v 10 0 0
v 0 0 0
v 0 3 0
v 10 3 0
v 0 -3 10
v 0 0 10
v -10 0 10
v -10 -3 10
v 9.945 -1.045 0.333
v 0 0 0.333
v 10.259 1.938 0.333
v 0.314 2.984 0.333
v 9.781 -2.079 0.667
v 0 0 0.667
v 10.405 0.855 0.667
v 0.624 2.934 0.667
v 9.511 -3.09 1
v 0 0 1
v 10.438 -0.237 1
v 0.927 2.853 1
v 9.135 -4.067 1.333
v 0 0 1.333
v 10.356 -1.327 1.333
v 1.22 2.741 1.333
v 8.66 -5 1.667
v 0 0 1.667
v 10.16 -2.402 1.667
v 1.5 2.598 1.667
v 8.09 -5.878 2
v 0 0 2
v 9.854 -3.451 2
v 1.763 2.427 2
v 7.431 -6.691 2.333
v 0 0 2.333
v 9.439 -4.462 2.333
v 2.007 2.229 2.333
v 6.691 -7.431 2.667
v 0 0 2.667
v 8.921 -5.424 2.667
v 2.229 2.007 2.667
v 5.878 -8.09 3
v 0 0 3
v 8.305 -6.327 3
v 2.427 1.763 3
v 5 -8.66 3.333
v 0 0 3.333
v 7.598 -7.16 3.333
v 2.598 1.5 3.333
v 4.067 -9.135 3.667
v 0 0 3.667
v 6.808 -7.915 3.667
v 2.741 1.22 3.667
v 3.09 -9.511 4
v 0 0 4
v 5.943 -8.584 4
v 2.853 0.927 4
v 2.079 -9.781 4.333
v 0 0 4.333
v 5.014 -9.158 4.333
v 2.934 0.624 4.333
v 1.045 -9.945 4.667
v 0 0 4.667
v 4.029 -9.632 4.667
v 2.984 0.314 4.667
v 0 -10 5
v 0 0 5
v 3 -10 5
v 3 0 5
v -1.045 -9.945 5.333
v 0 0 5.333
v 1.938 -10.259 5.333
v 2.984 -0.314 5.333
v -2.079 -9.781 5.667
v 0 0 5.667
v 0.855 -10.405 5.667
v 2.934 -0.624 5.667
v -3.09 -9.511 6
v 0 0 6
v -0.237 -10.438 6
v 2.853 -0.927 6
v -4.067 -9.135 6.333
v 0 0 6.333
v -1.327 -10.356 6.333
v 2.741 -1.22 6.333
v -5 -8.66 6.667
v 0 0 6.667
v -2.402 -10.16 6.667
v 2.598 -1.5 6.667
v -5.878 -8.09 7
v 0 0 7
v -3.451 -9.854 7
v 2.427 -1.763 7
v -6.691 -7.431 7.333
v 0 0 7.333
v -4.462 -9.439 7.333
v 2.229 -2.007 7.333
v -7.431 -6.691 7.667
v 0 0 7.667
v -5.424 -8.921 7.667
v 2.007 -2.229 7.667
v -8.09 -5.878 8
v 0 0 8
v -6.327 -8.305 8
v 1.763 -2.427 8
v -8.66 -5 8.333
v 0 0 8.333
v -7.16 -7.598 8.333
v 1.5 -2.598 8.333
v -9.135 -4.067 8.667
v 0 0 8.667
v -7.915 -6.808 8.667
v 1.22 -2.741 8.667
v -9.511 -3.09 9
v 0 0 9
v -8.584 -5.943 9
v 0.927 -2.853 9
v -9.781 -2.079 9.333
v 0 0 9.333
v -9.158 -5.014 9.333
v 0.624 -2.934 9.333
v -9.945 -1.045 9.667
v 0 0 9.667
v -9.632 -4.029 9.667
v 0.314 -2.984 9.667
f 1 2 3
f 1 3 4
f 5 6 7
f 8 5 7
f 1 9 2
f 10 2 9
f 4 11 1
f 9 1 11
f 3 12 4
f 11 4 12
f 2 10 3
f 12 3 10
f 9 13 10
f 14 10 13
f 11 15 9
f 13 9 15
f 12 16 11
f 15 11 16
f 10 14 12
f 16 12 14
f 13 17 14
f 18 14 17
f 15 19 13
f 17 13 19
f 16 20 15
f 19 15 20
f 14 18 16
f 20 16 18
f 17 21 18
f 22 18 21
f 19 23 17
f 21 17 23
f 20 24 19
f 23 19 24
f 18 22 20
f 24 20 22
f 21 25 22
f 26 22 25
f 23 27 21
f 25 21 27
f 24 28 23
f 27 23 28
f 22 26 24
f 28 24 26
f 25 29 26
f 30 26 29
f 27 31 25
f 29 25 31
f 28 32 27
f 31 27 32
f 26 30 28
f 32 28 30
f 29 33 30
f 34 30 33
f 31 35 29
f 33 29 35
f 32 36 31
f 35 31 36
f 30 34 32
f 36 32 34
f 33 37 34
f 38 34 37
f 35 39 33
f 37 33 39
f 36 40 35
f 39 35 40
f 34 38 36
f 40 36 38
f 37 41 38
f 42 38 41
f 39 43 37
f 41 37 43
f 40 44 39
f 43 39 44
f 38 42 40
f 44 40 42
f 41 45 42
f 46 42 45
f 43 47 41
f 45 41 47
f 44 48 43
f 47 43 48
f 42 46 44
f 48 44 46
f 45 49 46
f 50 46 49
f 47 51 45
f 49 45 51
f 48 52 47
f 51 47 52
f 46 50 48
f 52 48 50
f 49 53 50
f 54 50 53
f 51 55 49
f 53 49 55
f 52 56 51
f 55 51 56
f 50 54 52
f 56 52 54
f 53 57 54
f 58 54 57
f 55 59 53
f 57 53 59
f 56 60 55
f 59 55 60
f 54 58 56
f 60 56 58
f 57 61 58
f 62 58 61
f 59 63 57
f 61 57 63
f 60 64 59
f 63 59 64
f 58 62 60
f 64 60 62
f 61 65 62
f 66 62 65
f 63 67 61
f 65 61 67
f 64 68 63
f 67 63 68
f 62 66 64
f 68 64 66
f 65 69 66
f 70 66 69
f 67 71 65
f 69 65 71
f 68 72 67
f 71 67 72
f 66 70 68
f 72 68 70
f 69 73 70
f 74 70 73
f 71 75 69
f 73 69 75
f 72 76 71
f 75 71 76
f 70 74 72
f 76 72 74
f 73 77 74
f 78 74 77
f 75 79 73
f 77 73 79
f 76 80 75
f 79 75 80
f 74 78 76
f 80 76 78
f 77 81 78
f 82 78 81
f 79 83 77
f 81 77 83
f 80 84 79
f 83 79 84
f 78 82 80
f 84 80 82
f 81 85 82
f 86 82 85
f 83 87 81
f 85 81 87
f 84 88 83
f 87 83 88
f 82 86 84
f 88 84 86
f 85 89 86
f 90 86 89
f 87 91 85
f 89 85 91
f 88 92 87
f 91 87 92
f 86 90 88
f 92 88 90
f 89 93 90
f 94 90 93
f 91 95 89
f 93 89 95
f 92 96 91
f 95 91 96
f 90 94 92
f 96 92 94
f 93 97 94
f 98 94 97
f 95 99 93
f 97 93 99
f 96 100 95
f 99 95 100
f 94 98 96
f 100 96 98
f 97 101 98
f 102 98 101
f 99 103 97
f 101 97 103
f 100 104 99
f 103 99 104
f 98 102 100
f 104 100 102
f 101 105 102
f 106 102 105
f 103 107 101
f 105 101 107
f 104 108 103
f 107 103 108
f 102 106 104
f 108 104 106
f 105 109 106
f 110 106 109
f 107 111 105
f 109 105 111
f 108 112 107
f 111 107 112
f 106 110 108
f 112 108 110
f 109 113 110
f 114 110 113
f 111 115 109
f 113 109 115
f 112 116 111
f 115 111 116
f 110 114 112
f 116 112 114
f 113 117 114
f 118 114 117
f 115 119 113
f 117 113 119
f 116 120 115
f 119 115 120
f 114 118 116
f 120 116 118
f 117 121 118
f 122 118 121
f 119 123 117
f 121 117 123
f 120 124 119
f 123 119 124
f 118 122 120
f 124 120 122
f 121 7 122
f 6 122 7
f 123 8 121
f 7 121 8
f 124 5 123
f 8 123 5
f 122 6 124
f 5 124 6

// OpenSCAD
// Unequal edge lengths get unequal shares of the refinement budget, and a
// long/thin profile exercises the per-edge minimum.
$fa = 6; $fs = 1;
linear_extrude(height=10, twist=180) square([10,3]);
